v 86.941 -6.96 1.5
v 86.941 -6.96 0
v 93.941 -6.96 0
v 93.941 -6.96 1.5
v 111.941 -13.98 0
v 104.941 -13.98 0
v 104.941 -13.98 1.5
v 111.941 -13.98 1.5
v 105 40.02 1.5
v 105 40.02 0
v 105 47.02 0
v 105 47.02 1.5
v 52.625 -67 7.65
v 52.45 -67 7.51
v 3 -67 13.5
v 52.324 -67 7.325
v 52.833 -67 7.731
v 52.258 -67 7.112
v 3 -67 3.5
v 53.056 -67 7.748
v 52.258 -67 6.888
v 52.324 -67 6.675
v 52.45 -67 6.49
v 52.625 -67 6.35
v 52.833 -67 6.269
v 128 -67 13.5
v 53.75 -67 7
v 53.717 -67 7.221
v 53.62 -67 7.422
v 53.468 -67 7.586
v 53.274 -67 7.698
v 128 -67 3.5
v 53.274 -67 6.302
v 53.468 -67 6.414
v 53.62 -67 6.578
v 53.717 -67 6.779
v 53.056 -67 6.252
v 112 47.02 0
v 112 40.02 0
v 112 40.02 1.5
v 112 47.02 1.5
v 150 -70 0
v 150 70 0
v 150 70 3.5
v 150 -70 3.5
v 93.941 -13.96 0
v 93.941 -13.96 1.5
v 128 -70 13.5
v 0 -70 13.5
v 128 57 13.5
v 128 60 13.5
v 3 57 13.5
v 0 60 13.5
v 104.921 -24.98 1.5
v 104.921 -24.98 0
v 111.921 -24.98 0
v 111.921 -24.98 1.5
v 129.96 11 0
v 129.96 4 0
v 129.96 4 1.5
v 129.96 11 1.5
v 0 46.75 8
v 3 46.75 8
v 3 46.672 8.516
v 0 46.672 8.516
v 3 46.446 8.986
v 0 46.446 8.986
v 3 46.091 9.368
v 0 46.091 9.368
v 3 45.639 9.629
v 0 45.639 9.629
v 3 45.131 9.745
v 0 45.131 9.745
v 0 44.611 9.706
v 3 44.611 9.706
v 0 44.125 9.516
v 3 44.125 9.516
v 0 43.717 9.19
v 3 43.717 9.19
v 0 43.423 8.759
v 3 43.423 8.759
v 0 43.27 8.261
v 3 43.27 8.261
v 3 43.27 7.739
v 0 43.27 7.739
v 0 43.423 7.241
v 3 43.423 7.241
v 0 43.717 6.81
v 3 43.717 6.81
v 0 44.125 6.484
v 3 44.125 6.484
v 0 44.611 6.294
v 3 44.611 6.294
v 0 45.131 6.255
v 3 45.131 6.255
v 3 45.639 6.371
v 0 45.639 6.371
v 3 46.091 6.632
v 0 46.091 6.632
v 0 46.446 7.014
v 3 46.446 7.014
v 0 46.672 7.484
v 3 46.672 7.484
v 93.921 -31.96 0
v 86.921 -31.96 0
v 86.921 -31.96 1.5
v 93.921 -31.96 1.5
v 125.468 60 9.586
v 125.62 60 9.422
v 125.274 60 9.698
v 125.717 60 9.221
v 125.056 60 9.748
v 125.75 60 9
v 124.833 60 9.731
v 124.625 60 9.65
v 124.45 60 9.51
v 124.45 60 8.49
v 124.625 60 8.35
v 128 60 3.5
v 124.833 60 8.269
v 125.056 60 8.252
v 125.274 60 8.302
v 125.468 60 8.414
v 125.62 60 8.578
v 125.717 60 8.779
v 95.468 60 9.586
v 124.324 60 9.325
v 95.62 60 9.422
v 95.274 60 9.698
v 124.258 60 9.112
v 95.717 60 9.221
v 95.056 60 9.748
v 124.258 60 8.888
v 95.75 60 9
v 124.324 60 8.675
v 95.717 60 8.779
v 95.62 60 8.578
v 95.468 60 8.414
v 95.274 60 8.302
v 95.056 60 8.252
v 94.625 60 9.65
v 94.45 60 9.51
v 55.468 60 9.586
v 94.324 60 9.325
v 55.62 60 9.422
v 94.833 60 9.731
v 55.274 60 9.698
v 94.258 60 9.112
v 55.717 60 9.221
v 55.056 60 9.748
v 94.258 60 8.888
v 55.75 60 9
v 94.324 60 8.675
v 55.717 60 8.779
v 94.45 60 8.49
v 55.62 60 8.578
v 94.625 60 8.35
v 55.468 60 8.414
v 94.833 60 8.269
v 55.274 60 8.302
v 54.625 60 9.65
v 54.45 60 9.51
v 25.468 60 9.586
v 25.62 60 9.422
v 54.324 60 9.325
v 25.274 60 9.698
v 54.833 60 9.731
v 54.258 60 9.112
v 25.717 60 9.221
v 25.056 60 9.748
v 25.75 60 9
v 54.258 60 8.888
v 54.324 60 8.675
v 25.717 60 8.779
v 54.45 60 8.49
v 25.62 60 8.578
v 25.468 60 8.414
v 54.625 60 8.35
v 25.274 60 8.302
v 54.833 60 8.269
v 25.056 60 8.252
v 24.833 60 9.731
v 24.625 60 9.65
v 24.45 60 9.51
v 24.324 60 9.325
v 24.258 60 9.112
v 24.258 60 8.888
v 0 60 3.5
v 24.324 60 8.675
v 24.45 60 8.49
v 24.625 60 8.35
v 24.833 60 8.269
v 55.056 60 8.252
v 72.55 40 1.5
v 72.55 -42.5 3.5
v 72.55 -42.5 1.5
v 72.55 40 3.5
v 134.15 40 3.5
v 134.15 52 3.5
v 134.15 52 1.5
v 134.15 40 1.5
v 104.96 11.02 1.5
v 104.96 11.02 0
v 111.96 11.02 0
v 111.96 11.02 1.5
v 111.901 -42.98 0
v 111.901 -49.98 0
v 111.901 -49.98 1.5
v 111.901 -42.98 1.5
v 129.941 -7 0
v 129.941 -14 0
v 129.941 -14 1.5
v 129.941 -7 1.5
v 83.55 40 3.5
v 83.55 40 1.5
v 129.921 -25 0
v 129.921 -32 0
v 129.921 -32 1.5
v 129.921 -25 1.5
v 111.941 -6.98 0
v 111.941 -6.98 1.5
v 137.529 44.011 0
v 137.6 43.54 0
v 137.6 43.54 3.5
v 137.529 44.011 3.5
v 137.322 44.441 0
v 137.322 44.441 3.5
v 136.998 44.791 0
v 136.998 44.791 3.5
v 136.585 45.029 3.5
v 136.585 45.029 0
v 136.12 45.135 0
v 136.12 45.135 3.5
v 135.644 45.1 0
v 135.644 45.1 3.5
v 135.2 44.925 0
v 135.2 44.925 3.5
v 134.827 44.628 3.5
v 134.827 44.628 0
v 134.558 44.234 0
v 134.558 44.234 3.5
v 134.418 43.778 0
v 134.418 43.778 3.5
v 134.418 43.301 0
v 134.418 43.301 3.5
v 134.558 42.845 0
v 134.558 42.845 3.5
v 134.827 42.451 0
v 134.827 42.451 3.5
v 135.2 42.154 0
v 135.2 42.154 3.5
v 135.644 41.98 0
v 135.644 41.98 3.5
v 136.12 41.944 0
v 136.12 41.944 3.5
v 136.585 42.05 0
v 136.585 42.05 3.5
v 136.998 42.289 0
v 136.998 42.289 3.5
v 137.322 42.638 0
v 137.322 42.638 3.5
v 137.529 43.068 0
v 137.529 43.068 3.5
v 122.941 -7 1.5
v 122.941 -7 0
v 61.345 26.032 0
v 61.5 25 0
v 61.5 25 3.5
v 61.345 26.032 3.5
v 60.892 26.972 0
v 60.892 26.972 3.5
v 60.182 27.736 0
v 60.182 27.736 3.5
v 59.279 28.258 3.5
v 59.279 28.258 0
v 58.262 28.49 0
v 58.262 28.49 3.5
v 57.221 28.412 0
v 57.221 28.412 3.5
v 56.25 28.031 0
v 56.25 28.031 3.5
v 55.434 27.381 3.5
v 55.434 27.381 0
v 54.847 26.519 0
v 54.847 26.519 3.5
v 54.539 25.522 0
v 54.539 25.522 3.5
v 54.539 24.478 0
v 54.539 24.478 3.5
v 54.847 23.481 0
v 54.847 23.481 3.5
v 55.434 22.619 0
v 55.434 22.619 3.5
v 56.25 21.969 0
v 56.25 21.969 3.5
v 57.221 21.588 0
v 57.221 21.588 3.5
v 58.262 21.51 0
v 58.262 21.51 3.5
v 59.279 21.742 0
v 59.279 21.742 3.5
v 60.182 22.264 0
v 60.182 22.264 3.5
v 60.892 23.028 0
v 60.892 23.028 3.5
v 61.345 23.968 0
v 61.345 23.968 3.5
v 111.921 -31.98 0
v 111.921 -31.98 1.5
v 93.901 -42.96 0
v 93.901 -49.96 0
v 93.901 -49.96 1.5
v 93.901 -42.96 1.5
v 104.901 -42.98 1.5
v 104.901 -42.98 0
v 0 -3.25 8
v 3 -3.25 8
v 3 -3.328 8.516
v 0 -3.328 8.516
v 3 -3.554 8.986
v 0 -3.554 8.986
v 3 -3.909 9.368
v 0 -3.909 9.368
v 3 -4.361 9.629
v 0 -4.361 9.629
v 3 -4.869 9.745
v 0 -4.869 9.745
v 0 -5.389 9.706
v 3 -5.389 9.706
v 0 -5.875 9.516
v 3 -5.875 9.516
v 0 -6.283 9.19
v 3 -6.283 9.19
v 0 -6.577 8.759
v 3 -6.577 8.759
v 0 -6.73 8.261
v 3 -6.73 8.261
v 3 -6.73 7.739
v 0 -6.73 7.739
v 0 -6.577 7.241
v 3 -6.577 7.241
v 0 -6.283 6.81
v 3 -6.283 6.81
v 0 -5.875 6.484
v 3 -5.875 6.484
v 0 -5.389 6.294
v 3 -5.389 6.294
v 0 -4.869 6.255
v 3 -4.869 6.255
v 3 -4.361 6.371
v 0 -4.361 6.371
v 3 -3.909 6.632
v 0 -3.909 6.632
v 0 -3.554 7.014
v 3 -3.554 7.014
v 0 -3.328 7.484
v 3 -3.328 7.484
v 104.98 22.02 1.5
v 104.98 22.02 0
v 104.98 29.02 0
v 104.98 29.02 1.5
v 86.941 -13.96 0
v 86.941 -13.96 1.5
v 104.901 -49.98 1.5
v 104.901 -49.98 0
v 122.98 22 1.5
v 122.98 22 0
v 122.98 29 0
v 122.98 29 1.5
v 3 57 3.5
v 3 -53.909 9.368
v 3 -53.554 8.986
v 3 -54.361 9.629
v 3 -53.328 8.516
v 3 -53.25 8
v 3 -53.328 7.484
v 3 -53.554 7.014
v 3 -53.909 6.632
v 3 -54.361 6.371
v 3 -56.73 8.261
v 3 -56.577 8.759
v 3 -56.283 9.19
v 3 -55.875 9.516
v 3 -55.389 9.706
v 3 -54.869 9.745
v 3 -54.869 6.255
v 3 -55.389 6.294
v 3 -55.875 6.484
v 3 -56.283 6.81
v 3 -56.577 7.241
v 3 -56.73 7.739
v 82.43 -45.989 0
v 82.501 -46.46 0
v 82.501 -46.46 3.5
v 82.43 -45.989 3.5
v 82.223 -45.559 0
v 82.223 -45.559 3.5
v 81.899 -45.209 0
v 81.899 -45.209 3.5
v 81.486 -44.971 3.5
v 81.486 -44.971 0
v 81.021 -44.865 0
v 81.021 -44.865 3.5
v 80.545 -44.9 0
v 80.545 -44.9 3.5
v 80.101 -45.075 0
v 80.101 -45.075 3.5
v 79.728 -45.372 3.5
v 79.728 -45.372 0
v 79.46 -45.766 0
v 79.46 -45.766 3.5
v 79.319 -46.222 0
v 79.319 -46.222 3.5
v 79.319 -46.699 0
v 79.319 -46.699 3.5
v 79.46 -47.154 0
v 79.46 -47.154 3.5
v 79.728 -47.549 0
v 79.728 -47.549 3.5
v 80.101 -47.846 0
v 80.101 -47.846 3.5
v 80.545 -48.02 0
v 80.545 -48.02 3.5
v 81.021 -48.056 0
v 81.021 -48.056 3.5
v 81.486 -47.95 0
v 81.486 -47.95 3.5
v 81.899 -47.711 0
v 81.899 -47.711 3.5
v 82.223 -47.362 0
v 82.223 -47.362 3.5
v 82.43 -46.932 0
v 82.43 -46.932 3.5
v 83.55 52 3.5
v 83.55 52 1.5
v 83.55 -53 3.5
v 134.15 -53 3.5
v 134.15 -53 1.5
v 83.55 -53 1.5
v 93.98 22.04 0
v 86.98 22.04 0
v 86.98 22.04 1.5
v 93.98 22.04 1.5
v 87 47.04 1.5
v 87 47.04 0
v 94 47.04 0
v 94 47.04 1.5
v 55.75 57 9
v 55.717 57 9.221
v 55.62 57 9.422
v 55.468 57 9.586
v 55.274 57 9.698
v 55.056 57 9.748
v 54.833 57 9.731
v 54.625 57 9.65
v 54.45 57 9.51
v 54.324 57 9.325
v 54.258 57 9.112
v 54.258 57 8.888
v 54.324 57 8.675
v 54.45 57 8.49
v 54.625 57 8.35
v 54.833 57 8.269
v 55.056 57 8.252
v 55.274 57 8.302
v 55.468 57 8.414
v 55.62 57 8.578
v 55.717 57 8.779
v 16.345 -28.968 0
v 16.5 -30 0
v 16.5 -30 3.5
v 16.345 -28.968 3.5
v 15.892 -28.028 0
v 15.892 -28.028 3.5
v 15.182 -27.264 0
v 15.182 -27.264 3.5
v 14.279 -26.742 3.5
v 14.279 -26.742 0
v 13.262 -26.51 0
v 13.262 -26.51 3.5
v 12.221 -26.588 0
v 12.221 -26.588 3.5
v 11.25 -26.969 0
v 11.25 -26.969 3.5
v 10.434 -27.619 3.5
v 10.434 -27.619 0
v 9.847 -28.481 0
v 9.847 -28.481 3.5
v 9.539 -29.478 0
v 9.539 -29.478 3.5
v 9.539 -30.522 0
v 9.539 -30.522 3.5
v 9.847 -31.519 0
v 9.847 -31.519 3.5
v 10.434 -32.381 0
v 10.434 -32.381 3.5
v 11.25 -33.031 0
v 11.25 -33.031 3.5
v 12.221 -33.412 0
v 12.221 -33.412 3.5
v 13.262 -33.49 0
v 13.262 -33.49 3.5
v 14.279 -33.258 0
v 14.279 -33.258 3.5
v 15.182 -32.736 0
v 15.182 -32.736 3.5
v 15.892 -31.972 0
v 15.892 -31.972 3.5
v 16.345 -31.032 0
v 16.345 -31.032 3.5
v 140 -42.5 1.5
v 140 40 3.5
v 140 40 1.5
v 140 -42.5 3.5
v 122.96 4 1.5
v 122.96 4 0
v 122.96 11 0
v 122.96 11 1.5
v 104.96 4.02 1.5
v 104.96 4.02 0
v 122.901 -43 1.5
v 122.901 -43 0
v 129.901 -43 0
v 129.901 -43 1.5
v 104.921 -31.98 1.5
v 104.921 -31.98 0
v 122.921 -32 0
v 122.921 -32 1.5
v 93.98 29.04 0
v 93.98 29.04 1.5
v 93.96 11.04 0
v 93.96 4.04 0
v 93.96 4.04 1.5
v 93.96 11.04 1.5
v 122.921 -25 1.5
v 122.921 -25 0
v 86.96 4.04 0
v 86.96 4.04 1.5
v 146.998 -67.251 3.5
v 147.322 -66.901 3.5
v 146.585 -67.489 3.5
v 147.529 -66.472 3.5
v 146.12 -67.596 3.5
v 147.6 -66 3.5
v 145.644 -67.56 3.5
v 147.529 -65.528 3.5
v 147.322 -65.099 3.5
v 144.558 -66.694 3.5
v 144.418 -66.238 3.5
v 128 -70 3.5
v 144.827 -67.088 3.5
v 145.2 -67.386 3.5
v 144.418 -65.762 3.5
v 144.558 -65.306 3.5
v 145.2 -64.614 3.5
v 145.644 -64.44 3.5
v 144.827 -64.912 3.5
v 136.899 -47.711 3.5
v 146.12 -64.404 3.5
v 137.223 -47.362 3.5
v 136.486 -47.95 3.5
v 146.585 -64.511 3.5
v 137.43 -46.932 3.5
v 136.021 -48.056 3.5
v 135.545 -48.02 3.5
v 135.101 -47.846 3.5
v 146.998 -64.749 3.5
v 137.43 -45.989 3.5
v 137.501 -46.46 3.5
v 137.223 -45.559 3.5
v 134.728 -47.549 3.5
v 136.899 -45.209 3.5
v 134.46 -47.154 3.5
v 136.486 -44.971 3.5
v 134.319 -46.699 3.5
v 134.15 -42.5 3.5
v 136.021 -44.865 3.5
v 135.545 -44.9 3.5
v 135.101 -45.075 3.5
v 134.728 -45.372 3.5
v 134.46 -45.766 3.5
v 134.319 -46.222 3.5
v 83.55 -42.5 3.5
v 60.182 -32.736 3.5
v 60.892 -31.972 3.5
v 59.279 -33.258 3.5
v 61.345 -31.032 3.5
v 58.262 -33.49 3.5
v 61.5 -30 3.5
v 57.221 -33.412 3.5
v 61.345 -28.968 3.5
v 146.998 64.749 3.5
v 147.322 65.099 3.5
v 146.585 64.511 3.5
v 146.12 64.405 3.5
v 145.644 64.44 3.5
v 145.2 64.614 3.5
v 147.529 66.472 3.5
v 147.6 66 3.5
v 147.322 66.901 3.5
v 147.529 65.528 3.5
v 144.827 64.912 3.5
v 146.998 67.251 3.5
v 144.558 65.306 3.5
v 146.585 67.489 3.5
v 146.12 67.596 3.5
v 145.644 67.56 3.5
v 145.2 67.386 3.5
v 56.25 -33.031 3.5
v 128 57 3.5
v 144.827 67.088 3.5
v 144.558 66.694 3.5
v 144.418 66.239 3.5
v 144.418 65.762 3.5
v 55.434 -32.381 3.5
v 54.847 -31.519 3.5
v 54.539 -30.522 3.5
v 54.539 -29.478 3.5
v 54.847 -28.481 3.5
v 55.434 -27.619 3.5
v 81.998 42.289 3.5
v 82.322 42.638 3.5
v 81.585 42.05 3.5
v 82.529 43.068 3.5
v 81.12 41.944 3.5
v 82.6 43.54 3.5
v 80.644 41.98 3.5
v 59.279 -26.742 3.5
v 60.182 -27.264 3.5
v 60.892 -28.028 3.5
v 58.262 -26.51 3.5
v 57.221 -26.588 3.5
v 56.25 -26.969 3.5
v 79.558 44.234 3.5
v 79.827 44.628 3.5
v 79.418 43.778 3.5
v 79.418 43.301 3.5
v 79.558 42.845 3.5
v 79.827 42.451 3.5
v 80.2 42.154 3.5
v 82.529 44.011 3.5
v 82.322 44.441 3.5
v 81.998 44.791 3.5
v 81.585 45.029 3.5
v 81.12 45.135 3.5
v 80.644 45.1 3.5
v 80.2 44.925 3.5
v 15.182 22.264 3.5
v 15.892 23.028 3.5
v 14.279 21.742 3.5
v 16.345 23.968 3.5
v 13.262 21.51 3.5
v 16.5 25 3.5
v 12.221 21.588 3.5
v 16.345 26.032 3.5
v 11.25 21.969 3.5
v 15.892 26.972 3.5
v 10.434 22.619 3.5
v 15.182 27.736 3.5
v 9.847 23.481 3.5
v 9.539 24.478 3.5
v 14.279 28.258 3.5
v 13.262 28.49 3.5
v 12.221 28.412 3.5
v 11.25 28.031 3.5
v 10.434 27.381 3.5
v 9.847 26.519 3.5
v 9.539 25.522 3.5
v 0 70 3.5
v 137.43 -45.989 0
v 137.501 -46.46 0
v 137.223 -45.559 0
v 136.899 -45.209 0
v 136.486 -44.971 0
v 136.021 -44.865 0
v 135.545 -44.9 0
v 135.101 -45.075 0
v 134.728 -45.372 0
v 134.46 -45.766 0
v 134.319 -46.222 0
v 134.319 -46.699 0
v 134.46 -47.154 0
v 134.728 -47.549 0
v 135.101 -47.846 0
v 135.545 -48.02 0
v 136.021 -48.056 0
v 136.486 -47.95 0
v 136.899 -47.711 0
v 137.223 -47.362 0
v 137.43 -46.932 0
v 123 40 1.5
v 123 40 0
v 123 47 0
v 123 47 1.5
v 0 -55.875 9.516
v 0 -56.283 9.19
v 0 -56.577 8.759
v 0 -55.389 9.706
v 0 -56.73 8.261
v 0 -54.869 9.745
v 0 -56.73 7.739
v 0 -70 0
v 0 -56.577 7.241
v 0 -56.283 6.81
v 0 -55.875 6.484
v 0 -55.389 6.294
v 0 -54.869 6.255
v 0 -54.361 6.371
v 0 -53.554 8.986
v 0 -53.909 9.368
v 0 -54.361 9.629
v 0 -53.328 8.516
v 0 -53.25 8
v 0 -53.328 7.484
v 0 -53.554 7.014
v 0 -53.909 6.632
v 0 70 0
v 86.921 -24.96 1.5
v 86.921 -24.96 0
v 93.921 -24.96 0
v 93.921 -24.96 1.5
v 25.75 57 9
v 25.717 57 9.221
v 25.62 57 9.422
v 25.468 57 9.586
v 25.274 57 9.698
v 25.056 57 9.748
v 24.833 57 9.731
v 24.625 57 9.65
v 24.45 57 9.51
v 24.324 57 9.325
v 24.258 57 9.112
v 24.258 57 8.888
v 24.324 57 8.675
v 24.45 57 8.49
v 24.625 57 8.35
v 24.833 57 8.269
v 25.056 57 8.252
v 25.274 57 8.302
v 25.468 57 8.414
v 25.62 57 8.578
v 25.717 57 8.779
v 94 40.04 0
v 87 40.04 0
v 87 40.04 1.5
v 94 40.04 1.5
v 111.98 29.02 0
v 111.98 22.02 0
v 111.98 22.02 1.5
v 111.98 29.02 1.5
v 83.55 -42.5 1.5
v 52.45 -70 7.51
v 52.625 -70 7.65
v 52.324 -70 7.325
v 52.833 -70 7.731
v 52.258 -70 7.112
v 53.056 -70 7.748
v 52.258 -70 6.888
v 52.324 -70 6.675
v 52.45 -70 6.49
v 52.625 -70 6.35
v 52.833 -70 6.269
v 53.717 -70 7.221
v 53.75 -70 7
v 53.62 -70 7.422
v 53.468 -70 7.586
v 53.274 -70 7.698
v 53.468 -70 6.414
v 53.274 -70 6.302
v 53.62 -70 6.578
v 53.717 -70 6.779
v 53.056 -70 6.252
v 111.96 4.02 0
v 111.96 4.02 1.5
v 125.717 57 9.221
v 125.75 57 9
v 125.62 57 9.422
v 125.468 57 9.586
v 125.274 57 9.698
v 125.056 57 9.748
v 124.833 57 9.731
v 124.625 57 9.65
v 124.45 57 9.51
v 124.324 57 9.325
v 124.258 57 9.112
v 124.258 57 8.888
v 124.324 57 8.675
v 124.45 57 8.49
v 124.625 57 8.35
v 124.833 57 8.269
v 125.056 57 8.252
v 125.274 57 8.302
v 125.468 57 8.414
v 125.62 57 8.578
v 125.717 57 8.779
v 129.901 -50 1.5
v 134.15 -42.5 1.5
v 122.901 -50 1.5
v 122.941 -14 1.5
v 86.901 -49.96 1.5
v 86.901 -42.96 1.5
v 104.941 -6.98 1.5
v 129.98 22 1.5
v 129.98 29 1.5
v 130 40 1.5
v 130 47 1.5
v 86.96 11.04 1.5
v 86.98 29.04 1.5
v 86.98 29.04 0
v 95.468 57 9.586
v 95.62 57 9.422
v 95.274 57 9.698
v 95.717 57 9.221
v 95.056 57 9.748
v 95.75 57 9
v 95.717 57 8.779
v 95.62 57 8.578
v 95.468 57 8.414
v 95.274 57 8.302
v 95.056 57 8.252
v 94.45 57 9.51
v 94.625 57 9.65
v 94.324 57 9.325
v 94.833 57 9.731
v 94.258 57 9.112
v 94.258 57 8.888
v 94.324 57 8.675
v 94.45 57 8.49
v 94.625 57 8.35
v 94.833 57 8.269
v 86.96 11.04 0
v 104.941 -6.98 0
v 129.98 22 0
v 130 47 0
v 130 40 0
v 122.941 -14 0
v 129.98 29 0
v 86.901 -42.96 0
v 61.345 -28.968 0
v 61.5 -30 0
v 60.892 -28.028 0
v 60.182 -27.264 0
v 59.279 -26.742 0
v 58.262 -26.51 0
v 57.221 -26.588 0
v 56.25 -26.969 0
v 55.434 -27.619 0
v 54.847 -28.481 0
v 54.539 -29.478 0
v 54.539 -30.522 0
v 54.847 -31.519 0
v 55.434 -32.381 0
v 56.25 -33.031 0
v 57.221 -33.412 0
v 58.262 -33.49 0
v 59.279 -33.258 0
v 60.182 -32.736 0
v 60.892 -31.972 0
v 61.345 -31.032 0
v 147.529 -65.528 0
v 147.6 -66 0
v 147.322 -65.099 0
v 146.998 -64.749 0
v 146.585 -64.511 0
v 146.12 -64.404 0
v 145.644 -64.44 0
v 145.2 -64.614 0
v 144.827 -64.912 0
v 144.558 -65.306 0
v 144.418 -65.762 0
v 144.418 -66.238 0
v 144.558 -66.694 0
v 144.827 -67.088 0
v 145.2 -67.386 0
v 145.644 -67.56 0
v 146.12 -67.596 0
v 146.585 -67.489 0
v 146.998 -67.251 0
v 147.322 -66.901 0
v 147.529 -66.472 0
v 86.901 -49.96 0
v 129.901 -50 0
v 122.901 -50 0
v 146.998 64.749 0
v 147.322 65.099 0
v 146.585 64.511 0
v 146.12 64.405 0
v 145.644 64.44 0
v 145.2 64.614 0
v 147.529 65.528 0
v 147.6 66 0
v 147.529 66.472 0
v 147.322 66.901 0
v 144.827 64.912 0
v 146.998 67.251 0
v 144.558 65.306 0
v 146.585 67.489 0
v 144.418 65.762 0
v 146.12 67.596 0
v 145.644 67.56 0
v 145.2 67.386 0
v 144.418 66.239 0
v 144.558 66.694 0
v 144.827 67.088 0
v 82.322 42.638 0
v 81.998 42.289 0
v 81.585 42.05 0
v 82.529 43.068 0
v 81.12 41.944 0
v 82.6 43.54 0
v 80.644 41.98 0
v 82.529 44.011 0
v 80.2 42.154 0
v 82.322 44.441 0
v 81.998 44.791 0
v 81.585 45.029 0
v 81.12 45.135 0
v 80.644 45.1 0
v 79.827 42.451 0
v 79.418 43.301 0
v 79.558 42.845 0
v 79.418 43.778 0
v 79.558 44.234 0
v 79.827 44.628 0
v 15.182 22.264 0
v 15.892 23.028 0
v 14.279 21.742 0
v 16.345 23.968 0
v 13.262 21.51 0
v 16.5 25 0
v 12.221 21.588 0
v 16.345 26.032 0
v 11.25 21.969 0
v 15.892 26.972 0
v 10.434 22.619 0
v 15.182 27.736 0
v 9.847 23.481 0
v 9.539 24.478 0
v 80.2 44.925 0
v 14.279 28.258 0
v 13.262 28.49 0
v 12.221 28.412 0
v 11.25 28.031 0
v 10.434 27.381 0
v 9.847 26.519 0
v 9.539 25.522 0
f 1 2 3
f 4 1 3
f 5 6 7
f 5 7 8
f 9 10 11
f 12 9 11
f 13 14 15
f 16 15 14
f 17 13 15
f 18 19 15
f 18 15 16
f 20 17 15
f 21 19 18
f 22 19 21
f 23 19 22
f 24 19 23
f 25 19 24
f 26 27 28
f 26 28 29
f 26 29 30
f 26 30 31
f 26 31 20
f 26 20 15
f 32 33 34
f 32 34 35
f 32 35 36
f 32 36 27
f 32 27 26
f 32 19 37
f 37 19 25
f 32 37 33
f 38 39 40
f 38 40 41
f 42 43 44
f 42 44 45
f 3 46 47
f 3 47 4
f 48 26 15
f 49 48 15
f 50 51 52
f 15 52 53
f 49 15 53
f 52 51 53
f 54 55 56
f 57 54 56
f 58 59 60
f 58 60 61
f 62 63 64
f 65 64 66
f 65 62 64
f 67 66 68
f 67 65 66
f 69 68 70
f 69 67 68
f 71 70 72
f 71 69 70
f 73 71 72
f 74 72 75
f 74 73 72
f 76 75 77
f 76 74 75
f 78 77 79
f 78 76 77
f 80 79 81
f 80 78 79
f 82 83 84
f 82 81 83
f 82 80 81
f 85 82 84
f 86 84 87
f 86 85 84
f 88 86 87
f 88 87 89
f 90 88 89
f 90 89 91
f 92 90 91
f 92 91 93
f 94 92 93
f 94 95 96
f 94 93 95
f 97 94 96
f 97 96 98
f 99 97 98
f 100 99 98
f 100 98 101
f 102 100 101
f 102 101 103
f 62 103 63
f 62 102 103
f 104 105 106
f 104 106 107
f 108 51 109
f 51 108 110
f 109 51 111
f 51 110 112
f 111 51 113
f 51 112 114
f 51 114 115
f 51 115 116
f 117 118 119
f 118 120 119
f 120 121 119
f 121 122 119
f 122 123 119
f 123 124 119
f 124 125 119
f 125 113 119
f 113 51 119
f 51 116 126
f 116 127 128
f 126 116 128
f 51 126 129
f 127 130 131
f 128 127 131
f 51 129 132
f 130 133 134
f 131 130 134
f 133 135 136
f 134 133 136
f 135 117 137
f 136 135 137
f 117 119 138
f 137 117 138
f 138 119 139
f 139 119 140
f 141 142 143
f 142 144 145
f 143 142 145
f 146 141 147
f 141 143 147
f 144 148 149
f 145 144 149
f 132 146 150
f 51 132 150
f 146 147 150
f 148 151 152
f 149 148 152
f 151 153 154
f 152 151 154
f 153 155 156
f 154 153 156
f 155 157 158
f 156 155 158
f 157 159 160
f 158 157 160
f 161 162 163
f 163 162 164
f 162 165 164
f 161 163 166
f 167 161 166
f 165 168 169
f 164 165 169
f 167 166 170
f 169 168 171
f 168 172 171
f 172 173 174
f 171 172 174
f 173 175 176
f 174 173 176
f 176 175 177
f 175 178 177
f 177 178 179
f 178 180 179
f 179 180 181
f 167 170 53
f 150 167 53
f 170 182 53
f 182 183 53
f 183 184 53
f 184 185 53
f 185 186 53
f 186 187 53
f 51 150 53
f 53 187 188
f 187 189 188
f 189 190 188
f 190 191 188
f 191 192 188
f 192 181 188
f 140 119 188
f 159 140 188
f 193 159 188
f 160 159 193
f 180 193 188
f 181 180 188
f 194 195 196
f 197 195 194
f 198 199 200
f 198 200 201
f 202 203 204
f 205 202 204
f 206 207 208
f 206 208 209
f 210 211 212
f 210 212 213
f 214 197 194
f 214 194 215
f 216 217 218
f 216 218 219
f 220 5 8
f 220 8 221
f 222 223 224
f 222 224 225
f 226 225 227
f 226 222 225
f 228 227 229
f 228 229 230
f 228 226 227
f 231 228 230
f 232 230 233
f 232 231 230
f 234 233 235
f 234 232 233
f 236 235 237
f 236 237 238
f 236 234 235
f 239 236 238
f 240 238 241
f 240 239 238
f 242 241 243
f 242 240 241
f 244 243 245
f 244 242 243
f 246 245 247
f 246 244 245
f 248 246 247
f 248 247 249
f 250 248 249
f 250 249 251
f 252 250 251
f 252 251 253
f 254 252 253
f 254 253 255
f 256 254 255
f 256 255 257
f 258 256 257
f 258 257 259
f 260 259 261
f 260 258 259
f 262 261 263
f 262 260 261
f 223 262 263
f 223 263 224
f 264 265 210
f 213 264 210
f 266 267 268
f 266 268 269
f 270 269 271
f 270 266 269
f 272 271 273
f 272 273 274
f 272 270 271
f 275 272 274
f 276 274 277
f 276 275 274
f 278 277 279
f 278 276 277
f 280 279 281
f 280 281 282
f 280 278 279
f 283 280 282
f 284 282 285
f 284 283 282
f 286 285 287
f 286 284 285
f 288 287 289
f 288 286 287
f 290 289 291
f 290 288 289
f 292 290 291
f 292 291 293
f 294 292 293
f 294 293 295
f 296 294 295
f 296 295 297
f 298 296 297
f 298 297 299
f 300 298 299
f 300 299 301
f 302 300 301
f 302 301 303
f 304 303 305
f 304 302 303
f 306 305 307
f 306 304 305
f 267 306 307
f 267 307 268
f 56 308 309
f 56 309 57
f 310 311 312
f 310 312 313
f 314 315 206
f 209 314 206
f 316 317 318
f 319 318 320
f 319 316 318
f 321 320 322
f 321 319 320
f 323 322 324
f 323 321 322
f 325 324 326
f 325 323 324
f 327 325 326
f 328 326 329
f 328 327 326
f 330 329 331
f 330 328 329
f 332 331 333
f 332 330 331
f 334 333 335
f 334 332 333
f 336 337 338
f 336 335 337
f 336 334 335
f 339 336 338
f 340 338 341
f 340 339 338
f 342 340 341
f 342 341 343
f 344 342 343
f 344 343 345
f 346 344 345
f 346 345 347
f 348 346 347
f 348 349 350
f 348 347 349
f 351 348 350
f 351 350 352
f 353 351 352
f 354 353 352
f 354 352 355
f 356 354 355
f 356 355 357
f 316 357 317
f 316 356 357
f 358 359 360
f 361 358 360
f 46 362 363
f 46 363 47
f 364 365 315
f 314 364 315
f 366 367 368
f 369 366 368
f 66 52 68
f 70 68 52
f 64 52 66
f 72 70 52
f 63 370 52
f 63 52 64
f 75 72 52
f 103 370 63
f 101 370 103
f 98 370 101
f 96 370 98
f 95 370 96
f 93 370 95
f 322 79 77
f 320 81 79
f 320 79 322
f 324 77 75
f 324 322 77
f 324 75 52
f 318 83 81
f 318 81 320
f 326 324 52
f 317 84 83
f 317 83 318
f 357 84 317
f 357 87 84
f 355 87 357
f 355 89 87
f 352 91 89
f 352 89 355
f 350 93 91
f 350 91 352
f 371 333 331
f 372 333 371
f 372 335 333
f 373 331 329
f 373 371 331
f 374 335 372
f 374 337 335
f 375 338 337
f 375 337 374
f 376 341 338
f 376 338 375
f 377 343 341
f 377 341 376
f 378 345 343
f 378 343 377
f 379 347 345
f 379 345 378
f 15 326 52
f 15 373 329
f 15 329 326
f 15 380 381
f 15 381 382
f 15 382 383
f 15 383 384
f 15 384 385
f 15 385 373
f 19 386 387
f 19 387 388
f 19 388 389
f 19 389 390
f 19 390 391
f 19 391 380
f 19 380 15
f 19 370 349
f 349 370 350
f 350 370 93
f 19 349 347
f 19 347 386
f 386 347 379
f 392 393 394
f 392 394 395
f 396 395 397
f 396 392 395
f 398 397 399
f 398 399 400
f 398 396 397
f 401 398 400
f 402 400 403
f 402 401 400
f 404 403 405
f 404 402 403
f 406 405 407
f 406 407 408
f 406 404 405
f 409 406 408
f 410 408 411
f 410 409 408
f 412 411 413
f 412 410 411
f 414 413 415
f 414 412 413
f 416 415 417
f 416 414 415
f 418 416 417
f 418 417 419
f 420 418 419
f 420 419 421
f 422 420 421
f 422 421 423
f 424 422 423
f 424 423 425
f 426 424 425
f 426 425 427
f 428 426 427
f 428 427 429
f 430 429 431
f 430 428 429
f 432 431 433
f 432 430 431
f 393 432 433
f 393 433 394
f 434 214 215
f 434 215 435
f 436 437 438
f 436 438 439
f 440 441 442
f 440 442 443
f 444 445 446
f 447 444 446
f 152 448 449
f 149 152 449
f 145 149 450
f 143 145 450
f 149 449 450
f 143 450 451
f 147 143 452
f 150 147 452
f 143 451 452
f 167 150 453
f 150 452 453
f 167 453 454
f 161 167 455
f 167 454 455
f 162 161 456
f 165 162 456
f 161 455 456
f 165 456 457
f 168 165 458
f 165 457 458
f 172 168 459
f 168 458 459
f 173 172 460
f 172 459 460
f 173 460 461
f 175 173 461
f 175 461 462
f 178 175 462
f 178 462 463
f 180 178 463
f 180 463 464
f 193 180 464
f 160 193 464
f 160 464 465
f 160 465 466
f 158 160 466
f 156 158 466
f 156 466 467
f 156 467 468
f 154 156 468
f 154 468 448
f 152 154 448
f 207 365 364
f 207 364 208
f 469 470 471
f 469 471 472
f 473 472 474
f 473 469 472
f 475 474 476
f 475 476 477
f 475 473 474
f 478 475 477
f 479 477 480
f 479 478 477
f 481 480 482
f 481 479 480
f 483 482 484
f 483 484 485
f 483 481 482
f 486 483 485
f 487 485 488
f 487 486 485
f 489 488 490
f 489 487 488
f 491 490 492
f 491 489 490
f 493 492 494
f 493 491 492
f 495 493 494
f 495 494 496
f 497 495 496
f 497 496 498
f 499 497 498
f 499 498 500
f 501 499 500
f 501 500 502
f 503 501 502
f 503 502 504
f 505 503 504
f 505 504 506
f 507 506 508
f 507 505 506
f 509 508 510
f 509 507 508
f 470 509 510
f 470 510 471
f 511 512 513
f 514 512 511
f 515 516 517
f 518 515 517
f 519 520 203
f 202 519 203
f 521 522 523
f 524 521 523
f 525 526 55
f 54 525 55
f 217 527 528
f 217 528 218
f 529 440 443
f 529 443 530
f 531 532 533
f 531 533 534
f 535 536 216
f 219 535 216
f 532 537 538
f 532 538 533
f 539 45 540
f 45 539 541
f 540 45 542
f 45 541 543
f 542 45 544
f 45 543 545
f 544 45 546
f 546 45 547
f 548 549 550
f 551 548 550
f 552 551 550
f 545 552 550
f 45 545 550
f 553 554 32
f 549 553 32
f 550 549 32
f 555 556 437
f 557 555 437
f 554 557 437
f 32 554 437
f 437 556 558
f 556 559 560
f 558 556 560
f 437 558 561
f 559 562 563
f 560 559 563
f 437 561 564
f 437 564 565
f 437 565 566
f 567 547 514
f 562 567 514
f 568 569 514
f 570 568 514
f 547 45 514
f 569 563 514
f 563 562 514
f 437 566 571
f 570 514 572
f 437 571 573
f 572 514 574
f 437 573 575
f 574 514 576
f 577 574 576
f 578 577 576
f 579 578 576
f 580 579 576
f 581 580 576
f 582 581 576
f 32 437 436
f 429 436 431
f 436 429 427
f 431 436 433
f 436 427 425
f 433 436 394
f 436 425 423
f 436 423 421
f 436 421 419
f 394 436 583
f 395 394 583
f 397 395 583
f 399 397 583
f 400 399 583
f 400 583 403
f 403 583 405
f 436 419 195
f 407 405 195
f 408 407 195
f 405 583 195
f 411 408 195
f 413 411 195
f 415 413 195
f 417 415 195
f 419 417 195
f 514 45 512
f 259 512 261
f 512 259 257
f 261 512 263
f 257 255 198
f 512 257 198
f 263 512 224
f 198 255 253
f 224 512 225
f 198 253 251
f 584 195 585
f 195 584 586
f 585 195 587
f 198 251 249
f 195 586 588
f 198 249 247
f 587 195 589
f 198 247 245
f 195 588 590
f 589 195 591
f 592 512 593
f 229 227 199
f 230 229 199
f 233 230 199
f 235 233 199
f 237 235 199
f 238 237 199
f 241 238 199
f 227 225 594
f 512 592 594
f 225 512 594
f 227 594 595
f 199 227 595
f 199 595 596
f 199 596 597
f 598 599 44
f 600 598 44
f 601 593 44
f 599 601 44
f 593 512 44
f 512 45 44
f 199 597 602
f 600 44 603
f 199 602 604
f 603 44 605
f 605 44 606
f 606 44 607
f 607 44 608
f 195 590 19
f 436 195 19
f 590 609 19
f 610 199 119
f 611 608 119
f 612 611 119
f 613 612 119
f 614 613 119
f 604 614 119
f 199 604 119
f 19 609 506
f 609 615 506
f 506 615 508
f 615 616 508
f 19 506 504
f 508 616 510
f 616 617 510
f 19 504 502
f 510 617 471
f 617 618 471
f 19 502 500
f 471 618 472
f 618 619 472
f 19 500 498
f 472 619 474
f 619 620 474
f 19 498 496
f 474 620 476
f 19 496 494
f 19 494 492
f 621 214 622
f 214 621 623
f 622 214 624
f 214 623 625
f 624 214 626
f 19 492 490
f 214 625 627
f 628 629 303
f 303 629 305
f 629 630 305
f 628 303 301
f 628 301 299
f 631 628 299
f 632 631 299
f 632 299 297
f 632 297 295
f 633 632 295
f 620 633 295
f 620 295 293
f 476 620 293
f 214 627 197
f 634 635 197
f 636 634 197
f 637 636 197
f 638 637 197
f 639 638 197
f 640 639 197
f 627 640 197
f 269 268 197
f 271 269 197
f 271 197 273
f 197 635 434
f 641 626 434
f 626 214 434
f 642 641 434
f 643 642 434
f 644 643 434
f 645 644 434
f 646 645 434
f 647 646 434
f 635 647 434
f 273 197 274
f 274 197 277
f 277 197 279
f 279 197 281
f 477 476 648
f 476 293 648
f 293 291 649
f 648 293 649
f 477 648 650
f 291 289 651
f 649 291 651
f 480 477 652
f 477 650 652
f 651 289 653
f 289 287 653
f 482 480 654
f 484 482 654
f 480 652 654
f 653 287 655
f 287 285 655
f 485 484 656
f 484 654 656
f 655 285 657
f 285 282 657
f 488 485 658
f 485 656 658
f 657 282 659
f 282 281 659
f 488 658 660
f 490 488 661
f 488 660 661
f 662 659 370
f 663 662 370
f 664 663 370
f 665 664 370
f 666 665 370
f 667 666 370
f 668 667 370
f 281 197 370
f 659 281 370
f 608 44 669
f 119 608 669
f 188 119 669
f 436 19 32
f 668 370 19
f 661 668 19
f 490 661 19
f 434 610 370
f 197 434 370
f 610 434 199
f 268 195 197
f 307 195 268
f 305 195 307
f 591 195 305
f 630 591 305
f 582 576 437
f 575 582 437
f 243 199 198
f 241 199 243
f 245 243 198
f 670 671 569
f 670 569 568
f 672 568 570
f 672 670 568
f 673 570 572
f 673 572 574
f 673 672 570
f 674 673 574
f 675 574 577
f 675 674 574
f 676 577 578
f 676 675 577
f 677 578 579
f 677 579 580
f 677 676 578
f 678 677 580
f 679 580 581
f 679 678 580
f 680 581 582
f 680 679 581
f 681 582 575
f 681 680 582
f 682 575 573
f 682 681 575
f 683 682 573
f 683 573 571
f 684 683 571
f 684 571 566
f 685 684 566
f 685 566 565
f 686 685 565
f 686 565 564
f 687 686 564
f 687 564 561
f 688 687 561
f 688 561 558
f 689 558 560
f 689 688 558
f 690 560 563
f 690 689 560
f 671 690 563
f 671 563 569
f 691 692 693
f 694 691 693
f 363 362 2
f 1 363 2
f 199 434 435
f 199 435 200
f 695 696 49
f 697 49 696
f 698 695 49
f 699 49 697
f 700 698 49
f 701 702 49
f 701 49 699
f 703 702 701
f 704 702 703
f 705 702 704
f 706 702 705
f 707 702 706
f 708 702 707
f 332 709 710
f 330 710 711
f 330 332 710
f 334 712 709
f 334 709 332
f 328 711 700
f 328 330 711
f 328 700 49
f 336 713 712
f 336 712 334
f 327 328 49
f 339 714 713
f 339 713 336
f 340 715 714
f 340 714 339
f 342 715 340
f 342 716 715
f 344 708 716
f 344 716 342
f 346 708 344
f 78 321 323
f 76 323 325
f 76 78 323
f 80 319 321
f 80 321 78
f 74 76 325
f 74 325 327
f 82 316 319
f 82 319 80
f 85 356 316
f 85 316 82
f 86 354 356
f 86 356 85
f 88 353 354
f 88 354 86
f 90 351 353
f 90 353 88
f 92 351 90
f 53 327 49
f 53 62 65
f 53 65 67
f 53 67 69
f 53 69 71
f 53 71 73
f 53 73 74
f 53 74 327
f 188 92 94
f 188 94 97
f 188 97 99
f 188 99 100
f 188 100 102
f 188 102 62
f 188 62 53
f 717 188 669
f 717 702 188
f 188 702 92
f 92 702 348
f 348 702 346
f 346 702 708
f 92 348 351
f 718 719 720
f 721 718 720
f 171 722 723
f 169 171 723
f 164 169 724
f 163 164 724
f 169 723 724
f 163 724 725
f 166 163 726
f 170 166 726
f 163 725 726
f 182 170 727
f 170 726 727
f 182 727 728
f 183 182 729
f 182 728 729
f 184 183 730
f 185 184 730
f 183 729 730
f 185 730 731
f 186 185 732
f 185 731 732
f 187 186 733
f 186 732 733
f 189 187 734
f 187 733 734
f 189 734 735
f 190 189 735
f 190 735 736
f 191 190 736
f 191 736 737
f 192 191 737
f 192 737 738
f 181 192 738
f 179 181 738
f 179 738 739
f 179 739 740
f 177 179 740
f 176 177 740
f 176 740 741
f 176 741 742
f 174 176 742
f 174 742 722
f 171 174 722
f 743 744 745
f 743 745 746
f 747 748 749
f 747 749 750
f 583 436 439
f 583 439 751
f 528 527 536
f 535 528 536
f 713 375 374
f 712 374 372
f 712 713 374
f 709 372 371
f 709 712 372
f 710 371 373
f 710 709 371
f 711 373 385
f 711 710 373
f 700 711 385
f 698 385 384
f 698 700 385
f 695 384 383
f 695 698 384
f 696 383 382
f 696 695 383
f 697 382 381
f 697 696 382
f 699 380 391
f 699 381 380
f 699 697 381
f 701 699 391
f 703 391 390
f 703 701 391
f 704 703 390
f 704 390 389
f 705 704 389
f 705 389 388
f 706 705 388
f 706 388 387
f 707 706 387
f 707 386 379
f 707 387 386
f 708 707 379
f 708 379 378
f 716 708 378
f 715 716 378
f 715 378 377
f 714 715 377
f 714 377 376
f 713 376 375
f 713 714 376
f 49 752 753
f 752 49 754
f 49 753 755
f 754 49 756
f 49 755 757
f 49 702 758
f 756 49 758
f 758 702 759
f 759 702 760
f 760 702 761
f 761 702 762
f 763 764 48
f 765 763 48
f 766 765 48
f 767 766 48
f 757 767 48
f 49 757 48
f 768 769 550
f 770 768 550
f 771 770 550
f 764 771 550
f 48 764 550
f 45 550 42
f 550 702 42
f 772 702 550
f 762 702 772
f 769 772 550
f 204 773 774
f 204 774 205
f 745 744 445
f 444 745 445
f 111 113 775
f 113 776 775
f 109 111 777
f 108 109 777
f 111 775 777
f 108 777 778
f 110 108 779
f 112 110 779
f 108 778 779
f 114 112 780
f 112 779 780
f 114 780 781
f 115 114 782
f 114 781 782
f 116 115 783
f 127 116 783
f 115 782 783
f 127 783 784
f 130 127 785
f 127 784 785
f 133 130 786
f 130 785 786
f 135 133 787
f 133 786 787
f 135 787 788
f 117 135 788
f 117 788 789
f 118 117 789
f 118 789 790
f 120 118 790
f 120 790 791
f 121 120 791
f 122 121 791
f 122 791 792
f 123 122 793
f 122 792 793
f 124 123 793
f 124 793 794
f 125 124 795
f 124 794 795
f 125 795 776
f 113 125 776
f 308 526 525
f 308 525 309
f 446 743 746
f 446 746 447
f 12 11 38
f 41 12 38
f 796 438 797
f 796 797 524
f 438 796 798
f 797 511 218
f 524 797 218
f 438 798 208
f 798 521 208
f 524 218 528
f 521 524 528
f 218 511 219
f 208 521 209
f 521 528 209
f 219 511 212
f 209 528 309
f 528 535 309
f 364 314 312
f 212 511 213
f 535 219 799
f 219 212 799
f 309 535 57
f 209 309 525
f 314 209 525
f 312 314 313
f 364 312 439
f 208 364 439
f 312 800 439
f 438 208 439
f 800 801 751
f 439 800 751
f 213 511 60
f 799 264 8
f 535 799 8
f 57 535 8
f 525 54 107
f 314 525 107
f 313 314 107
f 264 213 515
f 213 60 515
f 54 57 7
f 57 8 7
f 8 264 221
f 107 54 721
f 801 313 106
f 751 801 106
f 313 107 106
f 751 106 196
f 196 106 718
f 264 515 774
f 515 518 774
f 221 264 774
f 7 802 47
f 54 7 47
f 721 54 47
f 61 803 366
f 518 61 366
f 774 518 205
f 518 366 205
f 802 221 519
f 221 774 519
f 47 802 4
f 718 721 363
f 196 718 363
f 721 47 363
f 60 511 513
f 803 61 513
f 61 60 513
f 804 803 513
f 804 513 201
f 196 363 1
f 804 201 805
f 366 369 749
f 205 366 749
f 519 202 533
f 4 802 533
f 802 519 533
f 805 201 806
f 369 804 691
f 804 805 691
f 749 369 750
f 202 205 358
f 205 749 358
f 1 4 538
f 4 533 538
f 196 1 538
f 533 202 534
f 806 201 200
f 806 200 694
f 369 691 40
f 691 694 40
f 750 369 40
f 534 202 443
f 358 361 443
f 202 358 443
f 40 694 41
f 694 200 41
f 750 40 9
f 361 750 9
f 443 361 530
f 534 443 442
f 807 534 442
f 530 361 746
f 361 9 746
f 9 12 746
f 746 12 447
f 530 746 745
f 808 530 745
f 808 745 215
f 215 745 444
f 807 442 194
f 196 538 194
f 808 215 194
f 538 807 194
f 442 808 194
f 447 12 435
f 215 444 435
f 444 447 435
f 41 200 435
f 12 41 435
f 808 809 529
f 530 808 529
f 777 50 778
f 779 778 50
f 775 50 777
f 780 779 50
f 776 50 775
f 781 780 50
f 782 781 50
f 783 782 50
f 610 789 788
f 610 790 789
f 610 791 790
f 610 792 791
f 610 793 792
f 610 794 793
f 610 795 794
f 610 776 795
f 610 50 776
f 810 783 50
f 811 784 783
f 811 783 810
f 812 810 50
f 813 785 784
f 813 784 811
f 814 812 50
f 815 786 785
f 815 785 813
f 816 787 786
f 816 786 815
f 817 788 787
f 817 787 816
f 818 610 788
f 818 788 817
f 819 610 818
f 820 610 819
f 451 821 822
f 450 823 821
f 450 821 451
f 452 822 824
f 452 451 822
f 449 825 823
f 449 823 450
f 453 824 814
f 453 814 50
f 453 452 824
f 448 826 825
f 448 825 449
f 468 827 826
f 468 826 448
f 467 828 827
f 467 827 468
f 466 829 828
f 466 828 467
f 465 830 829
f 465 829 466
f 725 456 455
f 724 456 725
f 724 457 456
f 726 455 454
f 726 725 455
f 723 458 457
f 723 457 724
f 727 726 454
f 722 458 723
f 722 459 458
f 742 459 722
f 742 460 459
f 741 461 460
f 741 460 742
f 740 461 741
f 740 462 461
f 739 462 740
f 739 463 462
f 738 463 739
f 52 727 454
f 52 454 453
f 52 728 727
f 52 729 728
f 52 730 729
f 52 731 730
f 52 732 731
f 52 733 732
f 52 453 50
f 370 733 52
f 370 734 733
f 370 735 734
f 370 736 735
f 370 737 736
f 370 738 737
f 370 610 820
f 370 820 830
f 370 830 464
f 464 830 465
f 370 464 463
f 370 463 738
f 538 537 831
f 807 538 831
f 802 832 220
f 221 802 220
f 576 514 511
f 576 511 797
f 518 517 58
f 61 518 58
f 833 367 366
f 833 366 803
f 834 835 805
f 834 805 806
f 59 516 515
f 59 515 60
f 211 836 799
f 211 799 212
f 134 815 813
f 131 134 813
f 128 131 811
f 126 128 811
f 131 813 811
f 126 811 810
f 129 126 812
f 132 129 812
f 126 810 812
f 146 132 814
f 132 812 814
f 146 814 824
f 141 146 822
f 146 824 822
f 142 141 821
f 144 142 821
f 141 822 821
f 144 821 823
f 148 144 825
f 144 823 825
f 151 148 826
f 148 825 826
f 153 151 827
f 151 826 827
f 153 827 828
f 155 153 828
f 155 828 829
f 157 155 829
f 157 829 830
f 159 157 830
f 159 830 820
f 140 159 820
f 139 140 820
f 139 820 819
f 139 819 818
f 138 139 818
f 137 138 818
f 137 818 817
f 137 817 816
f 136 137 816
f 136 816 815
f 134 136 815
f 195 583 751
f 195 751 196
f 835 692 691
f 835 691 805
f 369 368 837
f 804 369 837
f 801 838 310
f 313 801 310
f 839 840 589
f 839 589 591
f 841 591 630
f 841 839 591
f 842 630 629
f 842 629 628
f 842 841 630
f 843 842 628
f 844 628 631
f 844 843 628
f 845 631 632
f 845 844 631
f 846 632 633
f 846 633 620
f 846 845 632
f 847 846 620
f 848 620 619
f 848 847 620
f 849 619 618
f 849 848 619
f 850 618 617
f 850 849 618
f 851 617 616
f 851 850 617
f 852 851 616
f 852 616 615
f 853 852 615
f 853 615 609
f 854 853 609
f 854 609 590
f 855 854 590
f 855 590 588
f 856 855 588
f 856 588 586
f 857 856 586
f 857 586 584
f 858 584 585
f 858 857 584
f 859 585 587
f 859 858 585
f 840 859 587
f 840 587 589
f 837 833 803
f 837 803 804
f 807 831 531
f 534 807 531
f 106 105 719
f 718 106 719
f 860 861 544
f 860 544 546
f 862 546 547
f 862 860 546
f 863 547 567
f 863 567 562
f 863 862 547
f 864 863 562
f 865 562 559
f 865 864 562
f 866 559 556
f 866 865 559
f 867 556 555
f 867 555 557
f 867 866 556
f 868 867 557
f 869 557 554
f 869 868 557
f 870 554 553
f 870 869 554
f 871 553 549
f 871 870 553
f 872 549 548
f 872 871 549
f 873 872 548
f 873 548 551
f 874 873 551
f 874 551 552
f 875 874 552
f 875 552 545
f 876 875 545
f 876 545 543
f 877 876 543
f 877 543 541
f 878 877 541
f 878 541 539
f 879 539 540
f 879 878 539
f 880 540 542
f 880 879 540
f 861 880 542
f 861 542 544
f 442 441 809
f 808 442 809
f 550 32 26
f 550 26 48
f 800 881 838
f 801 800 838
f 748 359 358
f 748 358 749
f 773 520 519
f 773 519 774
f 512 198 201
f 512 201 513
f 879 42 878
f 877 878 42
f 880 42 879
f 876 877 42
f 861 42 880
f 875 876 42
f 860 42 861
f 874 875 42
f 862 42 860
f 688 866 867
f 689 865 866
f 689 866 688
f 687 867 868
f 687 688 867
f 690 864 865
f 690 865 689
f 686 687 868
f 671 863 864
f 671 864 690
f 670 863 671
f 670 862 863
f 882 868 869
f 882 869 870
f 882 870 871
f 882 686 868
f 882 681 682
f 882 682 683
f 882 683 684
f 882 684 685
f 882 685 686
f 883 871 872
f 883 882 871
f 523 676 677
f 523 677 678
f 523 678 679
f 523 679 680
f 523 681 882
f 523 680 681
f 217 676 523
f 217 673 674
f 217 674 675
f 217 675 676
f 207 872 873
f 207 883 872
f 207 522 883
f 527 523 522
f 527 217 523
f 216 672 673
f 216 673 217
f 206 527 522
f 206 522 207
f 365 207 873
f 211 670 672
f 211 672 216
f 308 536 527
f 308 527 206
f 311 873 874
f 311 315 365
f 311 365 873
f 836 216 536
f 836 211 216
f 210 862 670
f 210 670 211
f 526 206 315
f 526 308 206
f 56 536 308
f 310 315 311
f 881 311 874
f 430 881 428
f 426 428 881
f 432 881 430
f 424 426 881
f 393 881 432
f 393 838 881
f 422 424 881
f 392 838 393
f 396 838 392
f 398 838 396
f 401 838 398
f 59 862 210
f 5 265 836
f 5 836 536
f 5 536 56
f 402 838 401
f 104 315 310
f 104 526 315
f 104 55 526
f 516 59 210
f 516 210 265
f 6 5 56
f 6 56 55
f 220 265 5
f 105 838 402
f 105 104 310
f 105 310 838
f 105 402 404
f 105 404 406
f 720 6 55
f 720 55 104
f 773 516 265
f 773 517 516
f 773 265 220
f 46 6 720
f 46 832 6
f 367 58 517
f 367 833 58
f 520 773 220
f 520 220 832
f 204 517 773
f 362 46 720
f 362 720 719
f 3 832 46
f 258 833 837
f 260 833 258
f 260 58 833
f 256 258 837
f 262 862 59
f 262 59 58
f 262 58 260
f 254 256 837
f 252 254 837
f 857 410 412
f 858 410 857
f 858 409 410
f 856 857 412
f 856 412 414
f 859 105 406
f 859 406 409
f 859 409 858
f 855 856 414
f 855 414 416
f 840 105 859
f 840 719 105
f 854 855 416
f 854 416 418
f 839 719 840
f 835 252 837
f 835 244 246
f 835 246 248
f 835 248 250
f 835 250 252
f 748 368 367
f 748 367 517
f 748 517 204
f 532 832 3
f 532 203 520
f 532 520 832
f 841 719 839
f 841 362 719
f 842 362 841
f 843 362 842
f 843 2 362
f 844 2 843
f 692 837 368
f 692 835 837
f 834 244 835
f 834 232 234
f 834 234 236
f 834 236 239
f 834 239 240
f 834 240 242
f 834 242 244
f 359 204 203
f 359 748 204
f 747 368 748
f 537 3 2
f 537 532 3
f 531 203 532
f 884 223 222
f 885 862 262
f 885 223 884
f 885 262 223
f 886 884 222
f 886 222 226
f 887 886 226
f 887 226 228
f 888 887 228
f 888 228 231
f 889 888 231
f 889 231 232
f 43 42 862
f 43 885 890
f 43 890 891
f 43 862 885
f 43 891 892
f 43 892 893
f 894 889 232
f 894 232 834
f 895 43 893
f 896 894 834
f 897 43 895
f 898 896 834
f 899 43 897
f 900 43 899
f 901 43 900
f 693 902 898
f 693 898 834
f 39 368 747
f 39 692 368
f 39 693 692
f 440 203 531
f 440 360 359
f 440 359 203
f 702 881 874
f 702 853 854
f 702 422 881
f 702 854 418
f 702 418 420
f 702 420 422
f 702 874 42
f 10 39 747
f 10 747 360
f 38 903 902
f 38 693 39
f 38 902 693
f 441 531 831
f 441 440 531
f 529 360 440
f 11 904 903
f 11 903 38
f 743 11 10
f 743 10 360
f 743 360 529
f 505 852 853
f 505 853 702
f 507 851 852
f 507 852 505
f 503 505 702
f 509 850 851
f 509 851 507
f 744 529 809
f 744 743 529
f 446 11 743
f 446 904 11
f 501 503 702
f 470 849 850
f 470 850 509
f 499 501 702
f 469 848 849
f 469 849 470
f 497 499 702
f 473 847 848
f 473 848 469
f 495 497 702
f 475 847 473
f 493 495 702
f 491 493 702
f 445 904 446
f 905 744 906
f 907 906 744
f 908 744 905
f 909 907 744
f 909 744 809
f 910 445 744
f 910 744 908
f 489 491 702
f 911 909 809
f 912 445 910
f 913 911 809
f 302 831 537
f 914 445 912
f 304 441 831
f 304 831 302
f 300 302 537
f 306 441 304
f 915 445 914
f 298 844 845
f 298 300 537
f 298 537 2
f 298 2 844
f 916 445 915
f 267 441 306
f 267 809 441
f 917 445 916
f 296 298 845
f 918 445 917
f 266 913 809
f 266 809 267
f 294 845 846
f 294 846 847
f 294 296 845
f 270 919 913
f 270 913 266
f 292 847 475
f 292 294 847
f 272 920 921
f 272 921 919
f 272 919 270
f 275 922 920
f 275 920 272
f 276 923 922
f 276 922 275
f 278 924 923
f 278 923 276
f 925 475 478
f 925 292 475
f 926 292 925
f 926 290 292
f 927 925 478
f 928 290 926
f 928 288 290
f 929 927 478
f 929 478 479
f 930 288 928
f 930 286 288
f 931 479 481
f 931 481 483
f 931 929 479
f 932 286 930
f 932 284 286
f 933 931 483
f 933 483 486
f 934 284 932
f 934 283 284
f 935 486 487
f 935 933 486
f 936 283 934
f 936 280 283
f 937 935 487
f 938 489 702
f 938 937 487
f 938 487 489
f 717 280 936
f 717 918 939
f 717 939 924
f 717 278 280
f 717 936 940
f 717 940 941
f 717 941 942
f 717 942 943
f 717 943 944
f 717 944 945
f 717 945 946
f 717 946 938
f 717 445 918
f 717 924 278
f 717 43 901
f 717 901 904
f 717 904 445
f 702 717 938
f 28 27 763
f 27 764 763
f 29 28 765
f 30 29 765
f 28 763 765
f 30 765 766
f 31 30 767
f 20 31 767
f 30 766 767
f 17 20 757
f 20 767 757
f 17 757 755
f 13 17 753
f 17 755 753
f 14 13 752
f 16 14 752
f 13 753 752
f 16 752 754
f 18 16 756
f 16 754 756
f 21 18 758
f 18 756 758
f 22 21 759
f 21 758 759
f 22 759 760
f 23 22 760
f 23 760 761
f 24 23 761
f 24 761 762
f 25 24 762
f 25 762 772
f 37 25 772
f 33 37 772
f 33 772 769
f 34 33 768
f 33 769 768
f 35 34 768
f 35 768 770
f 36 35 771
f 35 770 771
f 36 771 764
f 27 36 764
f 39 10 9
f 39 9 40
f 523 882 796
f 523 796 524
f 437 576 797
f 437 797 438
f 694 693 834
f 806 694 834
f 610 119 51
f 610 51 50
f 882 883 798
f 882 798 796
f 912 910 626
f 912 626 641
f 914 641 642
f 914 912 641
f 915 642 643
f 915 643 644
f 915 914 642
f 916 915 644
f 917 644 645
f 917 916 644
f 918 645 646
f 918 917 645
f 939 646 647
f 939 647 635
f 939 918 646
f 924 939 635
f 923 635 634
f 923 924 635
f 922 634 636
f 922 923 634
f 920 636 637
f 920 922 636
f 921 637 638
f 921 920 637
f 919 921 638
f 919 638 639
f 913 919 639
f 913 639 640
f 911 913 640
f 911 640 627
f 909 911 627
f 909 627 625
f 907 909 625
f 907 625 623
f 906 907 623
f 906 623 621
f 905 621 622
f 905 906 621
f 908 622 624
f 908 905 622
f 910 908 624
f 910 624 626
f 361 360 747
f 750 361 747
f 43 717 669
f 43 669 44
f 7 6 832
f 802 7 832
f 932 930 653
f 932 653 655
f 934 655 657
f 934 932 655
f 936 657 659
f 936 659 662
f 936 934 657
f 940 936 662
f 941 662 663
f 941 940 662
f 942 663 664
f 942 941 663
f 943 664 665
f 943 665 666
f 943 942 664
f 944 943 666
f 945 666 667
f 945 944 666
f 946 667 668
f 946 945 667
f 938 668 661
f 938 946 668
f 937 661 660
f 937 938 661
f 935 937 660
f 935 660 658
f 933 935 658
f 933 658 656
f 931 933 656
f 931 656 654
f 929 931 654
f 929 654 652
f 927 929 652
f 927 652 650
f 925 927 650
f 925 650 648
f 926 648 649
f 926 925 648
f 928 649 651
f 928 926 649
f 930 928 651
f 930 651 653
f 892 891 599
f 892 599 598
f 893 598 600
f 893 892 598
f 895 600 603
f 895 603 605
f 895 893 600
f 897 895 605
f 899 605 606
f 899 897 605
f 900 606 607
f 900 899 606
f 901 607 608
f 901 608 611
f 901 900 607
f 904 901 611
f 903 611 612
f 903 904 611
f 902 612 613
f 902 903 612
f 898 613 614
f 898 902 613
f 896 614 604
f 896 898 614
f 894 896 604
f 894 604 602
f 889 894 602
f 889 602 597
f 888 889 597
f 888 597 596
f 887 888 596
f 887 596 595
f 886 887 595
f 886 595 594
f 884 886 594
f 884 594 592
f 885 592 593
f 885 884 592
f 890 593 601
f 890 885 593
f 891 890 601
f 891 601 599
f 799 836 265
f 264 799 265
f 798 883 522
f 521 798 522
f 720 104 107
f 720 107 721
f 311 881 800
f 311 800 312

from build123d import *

# Parameters (mm, degrees)
SKETCH013_R     = 3.5
SKETCH013_R_2   = 1.6
SKETCH013_W     = 7
SKETCH013_H     = 7
PAD004_DEPTH    = 3.5
PAD_DEPTH       = 10
SKETCH015_R     = 0.75
POCKET005_DEPTH = 7.5
SKETCH004_R     = 0.75
POCKET006_DEPTH = 10
SKETCH014_R     = 1.75
POCKET007_DEPTH = 5
POCKET_DEPTH    = 2


with BuildPart() as part:
    # Sketch013 → Pad004 (new body)
    with BuildSketch(Plane.XY):
        Polygon((0, 70), (150, 70.000096), (150, -70), (0, -70), align=None)
        with Locations((13, 25)):
            Circle(SKETCH013_R, mode=Mode.SUBTRACT)
        with Locations((58, 25)):
            Circle(SKETCH013_R, mode=Mode.SUBTRACT)
        with Locations((13, -30)):
            Circle(SKETCH013_R, mode=Mode.SUBTRACT)
        with Locations((58, -30)):
            Circle(SKETCH013_R, mode=Mode.SUBTRACT)
        with Locations((146, 66.000096)):
            Circle(SKETCH013_R_2, mode=Mode.SUBTRACT)
        with Locations((146, -66)):
            Circle(SKETCH013_R_2, mode=Mode.SUBTRACT)
        with Locations((81.000022, 43.53967)):
            Circle(SKETCH013_R_2, mode=Mode.SUBTRACT)
        with Locations((136, 43.53967)):
            Circle(SKETCH013_R_2, mode=Mode.SUBTRACT)
        with Locations((80.901087, -46.460276)):
            Circle(SKETCH013_R_2, mode=Mode.SUBTRACT)
        with Locations((135.901066, -46.460276)):
            Circle(SKETCH013_R_2, mode=Mode.SUBTRACT)
        with Locations((90.500022, 43.53967)):
            Rectangle(SKETCH013_W, SKETCH013_H, mode=Mode.SUBTRACT)
        with Locations((108.500011, 43.519883)):
            Rectangle(SKETCH013_W, SKETCH013_H, mode=Mode.SUBTRACT)
        with Locations((126.5, 43.500096)):
            Rectangle(SKETCH013_W, SKETCH013_H, mode=Mode.SUBTRACT)
        with Locations((90.480235, 25.539681)):
            Rectangle(SKETCH013_W, SKETCH013_H, mode=Mode.SUBTRACT)
        with Locations((108.480224, 25.519894)):
            Rectangle(SKETCH013_W, SKETCH013_H, mode=Mode.SUBTRACT)
        with Locations((126.480213, 25.500107)):
            Rectangle(SKETCH013_W, SKETCH013_H, mode=Mode.SUBTRACT)
        with Locations((90.460448, 7.539692)):
            Rectangle(SKETCH013_W, SKETCH013_H, mode=Mode.SUBTRACT)
        with Locations((108.460437, 7.519905)):
            Rectangle(SKETCH013_W, SKETCH013_H, mode=Mode.SUBTRACT)
        with Locations((126.460426, 7.500118)):
            Rectangle(SKETCH013_W, SKETCH013_H, mode=Mode.SUBTRACT)
        with Locations((90.440661, -10.460297)):
            Rectangle(SKETCH013_W, SKETCH013_H, mode=Mode.SUBTRACT)
        with Locations((108.44065, -10.480084)):
            Rectangle(SKETCH013_W, SKETCH013_H, mode=Mode.SUBTRACT)
        with Locations((126.440639, -10.499871)):
            Rectangle(SKETCH013_W, SKETCH013_H, mode=Mode.SUBTRACT)
        with Locations((90.420874, -28.460286)):
            Rectangle(SKETCH013_W, SKETCH013_H, mode=Mode.SUBTRACT)
        with Locations((108.420863, -28.480073)):
            Rectangle(SKETCH013_W, SKETCH013_H, mode=Mode.SUBTRACT)
        with Locations((126.420852, -28.49986)):
            Rectangle(SKETCH013_W, SKETCH013_H, mode=Mode.SUBTRACT)
        with Locations((90.401087, -46.460276)):
            Rectangle(SKETCH013_W, SKETCH013_H, mode=Mode.SUBTRACT)
        with Locations((108.401076, -46.480062)):
            Rectangle(SKETCH013_W, SKETCH013_H, mode=Mode.SUBTRACT)
        with Locations((126.401066, -46.499849)):
            Rectangle(SKETCH013_W, SKETCH013_H, mode=Mode.SUBTRACT)
    extrude(amount=PAD004_DEPTH)

    # Sketch001 → Pad (join)
    with BuildSketch(Plane.XY.offset(3.5)):
        Polygon((0, 60), (3, 60), (128, 60), (128, 57), (3, 57), (3, -67), (128, -67), (128, -70), (3, -70), (0, -70), align=None)
    extrude(amount=PAD_DEPTH)

    # Sketch015 → Pocket005 (cut, symmetric)
    with BuildSketch(Plane.XZ.offset(65)):
        with Locations((53, 7)):
            Circle(SKETCH015_R)
    extrude(amount=POCKET005_DEPTH, both=True, mode=Mode.SUBTRACT)

    # Sketch004 → Pocket006 (cut, symmetric)
    with BuildSketch(Plane.XZ.offset(-55)):
        with Locations((25, 9)):
            Circle(SKETCH004_R)
        with Locations((95, 9)):
            Circle(SKETCH004_R)
        with Locations((55, 9)):
            Circle(SKETCH004_R)
        with Locations((125, 9)):
            Circle(SKETCH004_R)
    extrude(amount=POCKET006_DEPTH, both=True, mode=Mode.SUBTRACT)

    # Sketch014 → Pocket007 (cut)
    with BuildSketch(Plane.YZ):
        with Locations((45, 8)):
            Circle(SKETCH014_R)
        with Locations((-5, 8)):
            Circle(SKETCH014_R)
        with Locations((-55, 8)):
            Circle(SKETCH014_R)
    extrude(amount=POCKET007_DEPTH, mode=Mode.SUBTRACT)

    # Sketch → Pocket (cut)
    with BuildSketch(Plane.XY.offset(3.5)):
        Polygon((83.55, 52), (134.15, 52), (134.15, 40), (140, 40), (140, -42.5), (134.15, -42.5), (134.15, -53), (83.55, -53), (83.55, -42.5), (72.55, -42.5), (72.55, 40), (83.55, 40), align=None)
    extrude(amount=-POCKET_DEPTH, mode=Mode.SUBTRACT)


solid = part.part
